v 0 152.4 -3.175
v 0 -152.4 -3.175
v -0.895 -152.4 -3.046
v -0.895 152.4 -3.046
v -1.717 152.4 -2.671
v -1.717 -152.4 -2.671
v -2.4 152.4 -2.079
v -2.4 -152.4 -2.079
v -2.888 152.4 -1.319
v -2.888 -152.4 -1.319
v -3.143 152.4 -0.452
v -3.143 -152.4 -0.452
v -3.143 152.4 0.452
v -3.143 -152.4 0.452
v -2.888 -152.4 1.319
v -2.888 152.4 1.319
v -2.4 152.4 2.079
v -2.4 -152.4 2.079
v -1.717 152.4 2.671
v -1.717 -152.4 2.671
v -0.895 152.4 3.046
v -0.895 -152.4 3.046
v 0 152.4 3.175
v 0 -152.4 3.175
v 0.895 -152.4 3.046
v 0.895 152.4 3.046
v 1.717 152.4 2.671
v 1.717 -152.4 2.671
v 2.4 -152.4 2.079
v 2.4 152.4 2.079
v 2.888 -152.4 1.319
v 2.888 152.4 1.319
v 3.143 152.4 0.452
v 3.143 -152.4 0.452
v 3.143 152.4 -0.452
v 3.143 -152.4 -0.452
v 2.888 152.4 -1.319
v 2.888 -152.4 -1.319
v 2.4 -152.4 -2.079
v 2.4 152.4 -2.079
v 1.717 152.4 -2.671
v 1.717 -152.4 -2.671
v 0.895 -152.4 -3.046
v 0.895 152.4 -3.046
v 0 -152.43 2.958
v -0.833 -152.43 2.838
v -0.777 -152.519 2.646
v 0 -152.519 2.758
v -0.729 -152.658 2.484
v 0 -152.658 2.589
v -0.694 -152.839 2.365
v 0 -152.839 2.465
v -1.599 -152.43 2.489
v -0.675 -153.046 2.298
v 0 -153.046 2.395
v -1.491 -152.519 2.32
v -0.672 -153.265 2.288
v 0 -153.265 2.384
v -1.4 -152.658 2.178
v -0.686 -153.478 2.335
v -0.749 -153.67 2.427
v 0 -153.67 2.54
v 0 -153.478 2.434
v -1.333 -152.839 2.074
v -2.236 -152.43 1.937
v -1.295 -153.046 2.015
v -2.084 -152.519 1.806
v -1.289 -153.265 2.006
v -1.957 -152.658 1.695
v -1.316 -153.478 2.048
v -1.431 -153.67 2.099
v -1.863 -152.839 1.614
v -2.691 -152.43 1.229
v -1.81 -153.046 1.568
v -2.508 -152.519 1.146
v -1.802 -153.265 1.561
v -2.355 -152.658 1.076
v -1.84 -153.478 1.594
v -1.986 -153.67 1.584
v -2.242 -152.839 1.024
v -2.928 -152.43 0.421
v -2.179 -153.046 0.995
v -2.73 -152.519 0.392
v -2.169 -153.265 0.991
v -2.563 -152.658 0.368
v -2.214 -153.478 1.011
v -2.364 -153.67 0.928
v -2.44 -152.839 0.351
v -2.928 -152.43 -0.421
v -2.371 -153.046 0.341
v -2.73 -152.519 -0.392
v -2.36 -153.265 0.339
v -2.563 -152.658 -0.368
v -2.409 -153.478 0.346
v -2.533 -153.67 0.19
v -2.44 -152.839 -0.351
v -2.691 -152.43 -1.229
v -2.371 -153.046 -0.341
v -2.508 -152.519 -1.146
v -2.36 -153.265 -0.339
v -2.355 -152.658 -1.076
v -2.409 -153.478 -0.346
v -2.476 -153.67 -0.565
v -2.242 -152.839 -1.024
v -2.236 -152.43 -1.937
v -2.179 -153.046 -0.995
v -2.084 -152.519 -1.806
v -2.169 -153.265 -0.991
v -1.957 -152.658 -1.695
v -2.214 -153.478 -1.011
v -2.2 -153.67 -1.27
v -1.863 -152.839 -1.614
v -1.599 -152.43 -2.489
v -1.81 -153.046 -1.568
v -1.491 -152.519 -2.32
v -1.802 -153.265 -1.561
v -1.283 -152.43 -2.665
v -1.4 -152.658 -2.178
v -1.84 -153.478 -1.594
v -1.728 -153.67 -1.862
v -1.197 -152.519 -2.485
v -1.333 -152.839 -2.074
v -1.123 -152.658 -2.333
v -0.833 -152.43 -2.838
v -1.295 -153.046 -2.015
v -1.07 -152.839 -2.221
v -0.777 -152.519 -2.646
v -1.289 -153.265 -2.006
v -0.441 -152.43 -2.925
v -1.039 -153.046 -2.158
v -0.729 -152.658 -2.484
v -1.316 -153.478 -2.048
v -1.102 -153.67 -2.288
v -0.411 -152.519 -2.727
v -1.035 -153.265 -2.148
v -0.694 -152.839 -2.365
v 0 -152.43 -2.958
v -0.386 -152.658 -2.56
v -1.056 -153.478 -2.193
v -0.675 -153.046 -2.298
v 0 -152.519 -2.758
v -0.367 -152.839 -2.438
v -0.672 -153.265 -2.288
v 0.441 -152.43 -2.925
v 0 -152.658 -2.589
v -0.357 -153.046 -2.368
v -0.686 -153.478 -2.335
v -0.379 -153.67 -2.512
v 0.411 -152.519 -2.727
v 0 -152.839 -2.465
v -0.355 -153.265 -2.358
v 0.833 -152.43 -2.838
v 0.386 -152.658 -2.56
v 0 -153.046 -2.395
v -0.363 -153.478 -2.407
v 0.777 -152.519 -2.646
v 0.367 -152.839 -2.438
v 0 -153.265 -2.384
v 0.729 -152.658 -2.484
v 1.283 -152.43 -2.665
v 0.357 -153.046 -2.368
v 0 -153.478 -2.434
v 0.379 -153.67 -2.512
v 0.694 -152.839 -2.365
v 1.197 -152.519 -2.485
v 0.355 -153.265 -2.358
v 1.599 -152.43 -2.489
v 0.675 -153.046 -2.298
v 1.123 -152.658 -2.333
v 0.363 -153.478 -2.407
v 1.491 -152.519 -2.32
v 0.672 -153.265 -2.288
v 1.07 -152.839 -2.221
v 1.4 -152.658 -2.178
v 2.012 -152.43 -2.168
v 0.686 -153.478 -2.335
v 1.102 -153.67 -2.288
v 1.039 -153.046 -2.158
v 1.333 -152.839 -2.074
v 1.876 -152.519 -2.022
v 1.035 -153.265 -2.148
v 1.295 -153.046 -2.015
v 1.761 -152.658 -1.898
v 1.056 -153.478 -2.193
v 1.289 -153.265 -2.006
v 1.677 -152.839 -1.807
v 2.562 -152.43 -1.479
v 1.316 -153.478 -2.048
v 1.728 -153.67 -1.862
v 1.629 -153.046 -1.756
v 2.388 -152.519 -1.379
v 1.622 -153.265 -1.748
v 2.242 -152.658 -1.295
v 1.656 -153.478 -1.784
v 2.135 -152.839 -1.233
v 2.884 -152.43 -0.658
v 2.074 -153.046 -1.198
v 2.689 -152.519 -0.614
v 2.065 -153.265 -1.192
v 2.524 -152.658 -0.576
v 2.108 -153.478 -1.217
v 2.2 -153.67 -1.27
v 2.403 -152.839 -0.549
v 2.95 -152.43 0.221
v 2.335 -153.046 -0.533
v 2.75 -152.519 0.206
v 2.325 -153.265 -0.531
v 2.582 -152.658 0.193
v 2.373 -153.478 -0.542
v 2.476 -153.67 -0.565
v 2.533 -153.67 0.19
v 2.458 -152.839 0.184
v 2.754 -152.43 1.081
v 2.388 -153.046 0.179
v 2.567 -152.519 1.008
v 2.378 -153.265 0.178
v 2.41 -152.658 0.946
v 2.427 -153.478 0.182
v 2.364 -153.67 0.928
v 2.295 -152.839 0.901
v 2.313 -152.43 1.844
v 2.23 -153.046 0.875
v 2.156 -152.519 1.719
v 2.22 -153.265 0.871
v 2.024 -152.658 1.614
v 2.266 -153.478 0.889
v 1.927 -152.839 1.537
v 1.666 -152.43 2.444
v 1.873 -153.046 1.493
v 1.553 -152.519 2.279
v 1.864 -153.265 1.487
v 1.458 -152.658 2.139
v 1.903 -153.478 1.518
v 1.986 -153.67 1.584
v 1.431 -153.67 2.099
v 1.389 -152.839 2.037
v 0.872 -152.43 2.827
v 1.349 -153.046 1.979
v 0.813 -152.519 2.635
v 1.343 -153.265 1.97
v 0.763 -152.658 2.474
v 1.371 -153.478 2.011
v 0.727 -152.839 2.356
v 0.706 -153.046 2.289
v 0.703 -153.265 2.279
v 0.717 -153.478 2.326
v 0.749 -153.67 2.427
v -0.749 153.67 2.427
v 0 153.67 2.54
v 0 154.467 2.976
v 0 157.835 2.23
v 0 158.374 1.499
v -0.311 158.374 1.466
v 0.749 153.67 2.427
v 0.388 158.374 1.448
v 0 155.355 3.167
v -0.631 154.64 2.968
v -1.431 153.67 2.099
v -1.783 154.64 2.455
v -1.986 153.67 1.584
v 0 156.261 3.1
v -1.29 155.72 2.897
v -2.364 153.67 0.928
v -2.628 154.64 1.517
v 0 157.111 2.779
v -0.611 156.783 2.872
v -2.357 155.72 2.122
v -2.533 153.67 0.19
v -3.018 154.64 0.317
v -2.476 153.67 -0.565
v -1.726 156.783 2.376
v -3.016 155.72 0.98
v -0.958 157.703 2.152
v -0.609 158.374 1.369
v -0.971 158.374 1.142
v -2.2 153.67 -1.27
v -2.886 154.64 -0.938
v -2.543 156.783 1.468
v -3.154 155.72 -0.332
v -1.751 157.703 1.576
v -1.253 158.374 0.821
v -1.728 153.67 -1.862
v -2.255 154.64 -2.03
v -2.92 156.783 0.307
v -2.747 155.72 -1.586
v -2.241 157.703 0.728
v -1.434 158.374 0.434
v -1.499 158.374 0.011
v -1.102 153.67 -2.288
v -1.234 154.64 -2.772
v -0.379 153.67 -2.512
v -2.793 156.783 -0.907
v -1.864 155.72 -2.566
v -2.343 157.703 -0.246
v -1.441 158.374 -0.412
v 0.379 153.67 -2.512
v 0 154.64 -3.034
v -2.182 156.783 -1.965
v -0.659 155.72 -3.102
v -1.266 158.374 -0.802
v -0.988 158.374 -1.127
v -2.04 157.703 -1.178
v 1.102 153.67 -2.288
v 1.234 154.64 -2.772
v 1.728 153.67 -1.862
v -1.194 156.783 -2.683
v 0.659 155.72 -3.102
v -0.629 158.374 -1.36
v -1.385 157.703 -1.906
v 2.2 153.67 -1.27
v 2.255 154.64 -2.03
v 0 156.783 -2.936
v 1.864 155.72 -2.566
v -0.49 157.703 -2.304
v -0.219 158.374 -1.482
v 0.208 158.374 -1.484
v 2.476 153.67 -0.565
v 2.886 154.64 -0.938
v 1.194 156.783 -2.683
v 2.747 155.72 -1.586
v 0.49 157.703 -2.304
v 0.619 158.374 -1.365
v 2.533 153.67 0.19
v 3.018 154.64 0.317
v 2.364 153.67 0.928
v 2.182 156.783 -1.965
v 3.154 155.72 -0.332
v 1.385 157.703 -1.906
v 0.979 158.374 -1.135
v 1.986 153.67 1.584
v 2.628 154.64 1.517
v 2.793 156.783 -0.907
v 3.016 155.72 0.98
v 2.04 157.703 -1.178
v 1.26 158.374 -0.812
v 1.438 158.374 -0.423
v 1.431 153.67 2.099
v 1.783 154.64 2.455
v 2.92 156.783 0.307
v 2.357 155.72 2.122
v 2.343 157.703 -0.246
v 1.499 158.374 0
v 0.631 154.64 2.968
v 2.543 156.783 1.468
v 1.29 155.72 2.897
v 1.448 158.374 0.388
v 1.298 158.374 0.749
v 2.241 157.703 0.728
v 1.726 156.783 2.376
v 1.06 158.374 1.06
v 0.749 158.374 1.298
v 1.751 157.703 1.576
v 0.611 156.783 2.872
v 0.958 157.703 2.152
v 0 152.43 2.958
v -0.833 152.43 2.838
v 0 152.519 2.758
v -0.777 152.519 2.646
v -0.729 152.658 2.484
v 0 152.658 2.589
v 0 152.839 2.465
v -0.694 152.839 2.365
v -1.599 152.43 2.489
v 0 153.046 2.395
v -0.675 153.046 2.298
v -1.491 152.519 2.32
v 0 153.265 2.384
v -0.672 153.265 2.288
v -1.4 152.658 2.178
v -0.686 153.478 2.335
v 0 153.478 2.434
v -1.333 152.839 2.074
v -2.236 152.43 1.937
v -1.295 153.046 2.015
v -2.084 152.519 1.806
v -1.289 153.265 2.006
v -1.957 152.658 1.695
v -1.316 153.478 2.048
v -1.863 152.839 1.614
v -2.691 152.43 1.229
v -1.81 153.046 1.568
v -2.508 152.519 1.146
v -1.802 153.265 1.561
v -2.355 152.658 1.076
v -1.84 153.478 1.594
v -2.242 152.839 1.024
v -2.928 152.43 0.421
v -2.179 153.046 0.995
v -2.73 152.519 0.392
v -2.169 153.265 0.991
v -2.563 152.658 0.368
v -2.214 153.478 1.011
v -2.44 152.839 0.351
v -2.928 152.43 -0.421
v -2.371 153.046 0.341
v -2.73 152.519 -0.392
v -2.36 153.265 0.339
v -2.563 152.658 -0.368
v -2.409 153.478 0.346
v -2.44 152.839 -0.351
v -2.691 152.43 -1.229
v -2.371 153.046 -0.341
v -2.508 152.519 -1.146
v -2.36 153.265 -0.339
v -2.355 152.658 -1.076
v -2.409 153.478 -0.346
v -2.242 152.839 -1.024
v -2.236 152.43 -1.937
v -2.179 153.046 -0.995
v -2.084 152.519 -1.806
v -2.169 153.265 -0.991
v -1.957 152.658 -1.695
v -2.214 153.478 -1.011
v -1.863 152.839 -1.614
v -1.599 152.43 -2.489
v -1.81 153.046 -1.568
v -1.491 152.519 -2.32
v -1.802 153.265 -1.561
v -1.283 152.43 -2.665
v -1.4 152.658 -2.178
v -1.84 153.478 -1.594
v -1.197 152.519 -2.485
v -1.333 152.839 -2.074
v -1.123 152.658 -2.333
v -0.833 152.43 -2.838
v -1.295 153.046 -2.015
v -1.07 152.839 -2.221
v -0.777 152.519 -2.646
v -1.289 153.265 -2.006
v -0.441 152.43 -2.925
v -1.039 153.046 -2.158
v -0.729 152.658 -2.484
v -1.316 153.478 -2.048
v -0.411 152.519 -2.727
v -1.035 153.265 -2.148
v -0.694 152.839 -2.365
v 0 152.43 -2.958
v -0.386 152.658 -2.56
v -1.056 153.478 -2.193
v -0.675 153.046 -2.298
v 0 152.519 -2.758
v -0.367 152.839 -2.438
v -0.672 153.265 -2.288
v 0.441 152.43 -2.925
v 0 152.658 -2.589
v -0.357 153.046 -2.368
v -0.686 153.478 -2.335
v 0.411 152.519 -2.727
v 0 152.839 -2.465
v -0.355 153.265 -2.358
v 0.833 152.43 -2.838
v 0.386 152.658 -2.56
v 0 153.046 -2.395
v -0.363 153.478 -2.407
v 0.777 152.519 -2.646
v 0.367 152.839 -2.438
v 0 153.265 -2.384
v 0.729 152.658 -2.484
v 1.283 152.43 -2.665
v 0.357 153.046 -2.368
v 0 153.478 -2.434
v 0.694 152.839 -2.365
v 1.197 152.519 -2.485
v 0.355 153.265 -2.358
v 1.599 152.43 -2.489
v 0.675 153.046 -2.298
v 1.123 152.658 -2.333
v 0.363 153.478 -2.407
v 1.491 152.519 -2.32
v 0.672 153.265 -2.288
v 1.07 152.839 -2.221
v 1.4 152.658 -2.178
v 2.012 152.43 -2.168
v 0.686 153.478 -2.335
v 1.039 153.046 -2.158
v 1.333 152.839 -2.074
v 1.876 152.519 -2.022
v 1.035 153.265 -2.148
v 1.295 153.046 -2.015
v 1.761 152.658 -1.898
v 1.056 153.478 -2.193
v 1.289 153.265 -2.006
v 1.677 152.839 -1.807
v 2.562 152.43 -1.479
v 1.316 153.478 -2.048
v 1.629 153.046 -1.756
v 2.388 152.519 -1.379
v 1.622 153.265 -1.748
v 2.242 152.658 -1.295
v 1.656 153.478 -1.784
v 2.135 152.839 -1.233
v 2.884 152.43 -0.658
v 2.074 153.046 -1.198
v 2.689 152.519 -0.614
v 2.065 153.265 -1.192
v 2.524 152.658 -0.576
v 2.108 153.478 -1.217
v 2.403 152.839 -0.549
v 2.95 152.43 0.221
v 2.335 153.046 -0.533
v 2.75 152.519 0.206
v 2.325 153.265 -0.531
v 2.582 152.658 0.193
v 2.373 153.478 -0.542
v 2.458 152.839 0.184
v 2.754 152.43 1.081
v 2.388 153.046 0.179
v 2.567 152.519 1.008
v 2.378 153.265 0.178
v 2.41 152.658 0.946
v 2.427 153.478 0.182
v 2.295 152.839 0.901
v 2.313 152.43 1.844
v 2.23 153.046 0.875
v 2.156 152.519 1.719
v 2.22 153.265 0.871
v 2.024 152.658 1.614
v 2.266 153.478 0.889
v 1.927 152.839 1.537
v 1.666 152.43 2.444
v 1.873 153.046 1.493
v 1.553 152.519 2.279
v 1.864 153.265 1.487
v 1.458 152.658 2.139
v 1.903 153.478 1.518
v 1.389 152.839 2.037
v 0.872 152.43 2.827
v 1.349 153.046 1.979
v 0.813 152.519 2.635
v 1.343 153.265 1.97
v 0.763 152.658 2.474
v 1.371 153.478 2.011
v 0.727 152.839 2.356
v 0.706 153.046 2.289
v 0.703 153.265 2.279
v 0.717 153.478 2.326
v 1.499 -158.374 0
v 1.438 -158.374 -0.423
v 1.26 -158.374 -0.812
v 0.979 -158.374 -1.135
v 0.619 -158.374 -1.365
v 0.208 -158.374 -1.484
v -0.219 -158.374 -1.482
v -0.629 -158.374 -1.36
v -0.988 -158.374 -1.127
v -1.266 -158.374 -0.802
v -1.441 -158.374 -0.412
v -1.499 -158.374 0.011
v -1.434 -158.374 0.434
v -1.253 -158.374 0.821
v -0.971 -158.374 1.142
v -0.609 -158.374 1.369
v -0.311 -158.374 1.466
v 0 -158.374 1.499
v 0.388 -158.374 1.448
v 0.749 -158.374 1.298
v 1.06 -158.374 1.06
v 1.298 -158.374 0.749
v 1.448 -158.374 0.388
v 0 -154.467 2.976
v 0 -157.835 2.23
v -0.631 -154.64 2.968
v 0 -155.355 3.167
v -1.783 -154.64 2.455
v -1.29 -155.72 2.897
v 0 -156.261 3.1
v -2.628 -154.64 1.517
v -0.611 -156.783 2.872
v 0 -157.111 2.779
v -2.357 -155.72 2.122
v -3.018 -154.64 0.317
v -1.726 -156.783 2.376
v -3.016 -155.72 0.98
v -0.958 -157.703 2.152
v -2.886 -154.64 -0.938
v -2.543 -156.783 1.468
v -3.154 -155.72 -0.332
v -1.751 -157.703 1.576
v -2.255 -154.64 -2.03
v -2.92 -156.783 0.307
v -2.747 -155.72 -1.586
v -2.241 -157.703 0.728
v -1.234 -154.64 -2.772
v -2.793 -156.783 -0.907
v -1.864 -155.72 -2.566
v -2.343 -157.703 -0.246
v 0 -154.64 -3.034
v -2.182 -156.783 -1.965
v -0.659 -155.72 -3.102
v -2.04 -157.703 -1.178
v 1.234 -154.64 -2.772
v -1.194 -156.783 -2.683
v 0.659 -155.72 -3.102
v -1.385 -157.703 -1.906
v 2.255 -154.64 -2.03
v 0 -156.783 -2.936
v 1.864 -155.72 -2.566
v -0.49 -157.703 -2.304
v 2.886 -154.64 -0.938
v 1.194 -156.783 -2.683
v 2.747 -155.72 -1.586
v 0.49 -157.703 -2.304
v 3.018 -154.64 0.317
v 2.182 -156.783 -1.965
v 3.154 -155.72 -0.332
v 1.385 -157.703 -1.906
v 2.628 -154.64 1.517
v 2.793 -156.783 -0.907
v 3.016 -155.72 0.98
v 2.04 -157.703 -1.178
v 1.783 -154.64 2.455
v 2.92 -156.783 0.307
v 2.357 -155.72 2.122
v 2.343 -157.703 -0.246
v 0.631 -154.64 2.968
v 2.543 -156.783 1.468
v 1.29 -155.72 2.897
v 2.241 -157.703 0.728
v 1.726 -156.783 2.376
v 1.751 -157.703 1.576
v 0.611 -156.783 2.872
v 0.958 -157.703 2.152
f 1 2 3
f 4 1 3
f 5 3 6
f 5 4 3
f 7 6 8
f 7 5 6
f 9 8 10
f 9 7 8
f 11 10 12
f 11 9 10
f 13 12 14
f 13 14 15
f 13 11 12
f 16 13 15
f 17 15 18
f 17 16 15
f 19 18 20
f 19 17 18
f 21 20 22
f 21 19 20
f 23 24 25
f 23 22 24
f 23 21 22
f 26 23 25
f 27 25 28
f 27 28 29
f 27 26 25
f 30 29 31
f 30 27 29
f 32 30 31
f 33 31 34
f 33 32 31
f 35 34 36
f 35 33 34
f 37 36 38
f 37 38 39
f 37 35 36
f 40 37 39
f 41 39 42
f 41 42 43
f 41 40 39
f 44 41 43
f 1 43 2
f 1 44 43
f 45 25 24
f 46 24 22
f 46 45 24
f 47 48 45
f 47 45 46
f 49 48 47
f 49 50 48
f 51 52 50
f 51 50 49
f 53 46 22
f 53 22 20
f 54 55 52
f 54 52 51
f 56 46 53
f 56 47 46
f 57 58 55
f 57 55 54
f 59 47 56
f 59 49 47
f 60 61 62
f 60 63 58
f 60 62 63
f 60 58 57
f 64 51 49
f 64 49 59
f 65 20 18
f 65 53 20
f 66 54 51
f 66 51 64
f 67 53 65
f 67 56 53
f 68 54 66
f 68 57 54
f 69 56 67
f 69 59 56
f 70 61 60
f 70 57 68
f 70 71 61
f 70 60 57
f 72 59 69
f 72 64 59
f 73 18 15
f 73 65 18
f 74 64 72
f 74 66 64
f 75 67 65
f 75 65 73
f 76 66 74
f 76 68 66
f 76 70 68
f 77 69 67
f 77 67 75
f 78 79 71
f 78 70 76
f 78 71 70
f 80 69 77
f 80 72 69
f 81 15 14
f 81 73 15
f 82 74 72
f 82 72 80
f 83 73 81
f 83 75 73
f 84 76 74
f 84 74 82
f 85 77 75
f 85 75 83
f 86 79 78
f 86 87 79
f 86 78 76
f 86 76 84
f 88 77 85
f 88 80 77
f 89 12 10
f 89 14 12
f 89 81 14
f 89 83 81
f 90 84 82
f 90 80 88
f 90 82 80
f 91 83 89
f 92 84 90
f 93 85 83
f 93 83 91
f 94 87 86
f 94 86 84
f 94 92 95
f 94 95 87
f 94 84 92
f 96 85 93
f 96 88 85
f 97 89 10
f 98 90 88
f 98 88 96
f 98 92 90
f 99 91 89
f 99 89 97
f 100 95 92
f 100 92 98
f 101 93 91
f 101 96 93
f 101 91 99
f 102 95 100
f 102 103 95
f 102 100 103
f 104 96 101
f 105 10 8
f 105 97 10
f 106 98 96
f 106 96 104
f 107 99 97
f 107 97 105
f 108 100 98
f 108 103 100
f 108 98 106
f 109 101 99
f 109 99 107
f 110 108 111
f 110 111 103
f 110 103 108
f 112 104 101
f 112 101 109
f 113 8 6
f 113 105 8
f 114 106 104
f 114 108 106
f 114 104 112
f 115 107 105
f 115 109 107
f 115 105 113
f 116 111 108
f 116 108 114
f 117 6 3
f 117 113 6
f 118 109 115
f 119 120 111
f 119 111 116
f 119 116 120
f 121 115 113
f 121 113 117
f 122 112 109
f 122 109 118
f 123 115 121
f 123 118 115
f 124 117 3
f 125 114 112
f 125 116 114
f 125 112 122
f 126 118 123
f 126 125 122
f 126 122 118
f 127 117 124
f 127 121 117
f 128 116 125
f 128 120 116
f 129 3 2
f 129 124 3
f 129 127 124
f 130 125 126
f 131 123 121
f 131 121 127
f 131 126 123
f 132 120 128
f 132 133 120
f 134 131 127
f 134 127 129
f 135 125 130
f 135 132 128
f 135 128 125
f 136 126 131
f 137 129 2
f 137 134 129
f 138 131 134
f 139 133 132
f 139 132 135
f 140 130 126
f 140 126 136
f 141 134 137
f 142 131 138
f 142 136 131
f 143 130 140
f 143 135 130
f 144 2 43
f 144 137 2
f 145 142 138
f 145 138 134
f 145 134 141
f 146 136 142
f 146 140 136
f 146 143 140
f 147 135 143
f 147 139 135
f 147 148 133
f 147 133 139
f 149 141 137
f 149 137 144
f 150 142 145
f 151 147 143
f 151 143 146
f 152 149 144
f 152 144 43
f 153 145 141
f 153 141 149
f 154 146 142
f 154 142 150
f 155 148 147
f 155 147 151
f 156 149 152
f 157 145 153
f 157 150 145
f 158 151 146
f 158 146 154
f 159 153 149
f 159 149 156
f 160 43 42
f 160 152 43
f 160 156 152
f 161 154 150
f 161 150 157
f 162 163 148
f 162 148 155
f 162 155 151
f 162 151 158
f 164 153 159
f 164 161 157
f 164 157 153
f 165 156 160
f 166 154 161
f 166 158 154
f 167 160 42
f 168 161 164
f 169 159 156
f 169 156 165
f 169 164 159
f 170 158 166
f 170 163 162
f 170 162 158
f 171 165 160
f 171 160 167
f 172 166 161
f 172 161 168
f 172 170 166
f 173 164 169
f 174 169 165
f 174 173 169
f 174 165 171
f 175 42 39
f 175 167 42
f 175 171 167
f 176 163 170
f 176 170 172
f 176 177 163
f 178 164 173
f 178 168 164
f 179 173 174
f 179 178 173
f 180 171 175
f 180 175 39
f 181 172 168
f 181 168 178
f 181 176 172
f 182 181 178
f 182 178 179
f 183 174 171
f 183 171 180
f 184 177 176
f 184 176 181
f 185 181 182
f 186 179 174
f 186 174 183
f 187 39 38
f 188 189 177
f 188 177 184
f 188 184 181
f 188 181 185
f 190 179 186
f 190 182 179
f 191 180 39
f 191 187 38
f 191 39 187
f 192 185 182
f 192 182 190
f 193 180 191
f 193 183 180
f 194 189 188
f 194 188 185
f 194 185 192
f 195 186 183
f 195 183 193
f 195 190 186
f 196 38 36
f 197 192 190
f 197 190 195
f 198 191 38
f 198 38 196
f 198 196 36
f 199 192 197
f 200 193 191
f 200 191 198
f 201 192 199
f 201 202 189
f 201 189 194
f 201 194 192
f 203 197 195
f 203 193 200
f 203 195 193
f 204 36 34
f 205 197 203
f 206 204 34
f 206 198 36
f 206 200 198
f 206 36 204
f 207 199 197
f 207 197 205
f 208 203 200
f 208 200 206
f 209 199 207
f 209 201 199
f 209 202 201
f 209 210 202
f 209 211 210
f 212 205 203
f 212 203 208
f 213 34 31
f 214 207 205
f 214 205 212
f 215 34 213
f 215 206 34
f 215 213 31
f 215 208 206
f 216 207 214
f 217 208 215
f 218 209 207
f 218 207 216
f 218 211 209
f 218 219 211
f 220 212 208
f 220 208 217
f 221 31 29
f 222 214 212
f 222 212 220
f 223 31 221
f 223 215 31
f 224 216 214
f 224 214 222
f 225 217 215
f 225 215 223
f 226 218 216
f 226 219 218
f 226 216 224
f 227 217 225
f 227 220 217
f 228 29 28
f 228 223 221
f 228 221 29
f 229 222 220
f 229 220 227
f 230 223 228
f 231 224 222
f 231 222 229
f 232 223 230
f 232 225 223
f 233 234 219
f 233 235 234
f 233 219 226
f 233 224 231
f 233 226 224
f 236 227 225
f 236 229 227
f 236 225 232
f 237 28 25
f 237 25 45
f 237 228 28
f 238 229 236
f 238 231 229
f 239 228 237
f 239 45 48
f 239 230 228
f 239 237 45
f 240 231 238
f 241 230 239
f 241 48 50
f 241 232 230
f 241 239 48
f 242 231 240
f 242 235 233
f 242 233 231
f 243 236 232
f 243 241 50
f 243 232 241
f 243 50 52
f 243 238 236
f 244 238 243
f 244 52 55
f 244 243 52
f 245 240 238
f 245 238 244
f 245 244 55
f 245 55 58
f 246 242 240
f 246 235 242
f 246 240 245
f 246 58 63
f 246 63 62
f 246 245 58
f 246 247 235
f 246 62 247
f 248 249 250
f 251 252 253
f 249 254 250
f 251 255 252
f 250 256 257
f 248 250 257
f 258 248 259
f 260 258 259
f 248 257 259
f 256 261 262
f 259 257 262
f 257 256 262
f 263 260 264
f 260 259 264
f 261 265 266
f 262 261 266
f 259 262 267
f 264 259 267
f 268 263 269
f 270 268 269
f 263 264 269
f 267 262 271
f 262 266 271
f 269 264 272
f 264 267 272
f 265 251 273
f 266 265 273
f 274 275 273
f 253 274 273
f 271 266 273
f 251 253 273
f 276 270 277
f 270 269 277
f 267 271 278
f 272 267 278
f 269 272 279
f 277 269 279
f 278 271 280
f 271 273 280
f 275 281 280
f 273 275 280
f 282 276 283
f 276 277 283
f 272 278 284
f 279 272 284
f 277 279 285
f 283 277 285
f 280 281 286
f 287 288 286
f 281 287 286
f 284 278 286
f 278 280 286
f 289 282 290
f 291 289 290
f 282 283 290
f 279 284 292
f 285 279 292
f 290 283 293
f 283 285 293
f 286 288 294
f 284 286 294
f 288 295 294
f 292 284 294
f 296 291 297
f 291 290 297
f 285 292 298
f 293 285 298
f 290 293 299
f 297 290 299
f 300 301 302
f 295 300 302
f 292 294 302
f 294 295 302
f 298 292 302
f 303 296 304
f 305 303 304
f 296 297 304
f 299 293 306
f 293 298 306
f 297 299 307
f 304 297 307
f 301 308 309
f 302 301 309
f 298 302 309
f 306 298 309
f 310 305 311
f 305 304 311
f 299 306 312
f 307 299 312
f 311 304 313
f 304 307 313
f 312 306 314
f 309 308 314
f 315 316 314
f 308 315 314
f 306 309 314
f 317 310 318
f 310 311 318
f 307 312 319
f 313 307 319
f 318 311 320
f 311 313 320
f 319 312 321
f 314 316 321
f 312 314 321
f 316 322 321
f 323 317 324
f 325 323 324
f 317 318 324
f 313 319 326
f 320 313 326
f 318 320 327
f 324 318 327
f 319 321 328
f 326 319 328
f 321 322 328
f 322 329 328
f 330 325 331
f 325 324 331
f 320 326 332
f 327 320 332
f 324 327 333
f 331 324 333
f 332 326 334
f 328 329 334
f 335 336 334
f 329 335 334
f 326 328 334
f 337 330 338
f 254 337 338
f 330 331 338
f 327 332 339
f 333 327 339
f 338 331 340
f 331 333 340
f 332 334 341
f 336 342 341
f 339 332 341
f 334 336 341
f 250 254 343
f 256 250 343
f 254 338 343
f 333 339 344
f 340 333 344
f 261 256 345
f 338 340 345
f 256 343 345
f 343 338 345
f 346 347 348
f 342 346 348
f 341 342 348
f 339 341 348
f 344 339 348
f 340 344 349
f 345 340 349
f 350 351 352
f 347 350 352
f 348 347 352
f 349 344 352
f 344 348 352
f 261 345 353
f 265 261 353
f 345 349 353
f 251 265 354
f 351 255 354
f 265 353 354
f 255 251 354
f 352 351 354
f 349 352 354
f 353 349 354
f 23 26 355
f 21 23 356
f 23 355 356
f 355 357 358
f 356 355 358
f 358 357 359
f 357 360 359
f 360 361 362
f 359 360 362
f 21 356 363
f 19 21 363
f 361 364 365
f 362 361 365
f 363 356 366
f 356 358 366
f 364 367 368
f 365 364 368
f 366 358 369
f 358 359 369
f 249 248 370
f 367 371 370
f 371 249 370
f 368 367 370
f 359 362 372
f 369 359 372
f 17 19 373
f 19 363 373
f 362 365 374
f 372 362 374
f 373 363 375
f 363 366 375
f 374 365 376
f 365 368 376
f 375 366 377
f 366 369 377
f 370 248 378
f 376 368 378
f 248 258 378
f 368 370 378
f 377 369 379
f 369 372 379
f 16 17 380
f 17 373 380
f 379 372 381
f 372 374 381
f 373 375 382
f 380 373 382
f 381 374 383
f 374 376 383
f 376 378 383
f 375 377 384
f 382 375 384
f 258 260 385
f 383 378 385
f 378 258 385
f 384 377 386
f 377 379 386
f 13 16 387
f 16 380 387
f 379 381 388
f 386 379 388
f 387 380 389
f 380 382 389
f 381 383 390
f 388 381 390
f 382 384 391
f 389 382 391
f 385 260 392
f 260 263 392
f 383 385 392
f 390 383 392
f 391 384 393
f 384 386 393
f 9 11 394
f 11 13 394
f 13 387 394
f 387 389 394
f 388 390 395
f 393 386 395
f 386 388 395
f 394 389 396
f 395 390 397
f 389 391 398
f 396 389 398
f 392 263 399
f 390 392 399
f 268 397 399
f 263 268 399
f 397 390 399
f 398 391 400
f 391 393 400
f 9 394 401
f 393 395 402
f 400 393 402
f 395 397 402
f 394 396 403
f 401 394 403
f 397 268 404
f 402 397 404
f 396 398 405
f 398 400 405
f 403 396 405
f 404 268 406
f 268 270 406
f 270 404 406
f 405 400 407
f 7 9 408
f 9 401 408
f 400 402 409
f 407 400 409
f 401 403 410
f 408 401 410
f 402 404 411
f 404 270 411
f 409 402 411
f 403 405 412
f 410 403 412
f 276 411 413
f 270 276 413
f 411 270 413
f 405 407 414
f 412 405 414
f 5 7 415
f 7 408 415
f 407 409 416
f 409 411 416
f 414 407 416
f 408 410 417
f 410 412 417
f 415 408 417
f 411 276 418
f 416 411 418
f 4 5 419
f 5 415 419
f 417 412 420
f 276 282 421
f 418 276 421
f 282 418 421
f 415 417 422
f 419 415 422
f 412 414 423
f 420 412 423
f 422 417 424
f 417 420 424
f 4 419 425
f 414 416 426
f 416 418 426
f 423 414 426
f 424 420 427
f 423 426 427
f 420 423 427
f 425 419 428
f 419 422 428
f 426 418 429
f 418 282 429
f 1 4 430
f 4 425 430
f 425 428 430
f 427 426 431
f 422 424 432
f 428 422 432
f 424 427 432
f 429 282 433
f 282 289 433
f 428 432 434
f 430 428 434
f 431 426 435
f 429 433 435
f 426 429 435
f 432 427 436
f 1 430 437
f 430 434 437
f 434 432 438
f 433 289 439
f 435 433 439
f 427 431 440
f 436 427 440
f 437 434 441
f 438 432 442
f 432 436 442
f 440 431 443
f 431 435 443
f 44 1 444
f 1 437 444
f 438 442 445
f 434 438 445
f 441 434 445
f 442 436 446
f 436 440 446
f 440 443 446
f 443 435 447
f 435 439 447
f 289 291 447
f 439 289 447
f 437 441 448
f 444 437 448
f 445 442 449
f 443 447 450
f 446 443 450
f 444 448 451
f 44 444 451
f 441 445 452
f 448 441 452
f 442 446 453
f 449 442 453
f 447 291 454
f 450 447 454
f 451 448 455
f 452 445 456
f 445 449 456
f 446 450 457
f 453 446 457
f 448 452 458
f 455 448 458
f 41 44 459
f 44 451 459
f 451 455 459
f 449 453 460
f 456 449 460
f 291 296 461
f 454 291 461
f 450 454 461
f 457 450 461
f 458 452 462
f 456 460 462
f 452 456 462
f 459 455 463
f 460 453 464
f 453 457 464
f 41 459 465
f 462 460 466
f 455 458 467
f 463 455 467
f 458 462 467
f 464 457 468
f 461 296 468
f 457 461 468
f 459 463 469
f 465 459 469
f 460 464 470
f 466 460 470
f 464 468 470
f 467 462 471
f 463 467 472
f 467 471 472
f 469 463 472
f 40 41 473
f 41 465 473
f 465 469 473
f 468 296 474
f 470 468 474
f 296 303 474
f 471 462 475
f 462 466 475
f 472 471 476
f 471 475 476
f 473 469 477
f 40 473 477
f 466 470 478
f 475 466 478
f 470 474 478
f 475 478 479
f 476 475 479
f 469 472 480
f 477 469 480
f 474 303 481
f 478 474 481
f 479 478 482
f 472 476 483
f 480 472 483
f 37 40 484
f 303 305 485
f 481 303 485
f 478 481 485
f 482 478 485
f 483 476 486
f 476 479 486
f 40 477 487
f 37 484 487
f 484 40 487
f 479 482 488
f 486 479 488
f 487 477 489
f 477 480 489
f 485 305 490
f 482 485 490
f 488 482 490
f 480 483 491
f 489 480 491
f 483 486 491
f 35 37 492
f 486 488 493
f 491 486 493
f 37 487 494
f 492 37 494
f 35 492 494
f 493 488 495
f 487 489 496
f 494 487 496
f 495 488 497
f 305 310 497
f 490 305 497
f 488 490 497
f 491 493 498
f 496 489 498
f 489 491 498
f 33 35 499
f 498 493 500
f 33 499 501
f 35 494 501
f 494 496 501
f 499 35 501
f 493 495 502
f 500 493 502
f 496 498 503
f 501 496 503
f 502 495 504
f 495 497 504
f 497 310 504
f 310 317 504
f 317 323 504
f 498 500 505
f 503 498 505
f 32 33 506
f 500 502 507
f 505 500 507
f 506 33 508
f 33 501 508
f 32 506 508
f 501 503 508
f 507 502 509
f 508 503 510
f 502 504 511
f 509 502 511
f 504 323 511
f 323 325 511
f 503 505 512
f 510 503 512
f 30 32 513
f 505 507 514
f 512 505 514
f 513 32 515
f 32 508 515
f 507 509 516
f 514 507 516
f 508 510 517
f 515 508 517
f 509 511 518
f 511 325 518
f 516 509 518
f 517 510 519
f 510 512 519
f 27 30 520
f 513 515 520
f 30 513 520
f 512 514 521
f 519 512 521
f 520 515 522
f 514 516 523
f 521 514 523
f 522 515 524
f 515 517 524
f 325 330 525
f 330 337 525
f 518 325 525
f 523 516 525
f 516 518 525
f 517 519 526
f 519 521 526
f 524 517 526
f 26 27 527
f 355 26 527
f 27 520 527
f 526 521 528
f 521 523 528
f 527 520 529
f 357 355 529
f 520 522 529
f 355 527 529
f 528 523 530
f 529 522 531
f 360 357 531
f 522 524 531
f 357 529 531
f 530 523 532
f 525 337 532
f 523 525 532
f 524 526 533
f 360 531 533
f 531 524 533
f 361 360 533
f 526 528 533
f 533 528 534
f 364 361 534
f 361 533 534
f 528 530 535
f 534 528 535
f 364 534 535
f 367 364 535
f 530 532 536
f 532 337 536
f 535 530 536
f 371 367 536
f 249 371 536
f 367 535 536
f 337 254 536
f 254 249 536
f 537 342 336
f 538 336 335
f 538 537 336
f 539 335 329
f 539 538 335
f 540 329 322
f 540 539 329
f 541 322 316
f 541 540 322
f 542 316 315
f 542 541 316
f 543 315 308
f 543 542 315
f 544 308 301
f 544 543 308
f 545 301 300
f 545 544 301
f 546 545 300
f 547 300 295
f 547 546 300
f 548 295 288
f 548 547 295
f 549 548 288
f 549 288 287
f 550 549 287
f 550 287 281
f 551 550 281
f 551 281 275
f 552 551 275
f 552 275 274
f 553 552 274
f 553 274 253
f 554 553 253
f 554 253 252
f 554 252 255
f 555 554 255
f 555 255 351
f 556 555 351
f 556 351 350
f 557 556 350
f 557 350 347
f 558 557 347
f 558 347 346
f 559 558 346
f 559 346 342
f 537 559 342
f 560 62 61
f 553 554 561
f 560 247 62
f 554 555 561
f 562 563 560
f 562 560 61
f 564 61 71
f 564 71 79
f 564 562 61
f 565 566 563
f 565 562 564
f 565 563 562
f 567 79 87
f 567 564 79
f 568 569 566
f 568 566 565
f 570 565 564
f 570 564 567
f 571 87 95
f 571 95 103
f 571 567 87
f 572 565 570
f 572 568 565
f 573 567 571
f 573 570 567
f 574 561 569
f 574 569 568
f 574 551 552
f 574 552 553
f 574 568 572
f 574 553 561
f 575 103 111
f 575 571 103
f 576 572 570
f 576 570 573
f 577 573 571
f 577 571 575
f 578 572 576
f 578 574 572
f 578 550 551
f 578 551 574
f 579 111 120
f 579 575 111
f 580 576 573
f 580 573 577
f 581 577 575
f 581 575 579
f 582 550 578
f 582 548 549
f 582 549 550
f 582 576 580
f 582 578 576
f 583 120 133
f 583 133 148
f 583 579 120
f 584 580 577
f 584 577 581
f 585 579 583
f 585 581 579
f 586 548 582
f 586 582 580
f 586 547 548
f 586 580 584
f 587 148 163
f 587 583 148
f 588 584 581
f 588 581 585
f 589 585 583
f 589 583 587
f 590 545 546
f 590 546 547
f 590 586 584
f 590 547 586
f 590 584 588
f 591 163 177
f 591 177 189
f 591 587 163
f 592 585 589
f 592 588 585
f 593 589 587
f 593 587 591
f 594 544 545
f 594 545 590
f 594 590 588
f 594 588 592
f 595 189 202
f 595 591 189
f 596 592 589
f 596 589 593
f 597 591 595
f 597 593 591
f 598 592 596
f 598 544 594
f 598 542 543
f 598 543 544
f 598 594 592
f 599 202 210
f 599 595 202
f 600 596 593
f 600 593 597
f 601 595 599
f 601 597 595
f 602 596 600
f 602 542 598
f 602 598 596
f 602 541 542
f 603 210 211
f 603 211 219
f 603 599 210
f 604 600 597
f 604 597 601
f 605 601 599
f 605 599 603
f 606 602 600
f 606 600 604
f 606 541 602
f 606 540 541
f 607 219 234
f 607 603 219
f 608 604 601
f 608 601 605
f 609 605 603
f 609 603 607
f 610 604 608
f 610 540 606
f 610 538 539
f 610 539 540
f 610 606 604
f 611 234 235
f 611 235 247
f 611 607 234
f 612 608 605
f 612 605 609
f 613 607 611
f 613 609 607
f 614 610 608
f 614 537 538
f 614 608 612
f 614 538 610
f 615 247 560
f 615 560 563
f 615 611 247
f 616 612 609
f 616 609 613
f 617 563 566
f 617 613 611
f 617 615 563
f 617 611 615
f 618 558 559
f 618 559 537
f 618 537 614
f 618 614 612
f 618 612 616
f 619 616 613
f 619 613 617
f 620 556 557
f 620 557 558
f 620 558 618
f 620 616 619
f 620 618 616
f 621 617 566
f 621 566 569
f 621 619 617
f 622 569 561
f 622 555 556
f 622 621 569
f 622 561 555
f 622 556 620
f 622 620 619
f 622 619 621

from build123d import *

# Parameters (mm, degrees)
SKETCH1_R               = 3.175
BOSS_EXTRUDE1_DEPTH     = 152.4
CUT_EXTRUDE1_DEPTH      = 159.813487305
CUT_EXTRUDE1_DEPTH_BACK = 159.813487305
SKETCH3_R               = 1.4986


with BuildPart() as part:
    # Sketch1 → Boss-Extrude1 (new, symmetric)
    with BuildSketch(Plane(origin=(0, 0, 0), x_dir=(1, 0, 0), z_dir=(0, 1, 0))):
        with Locations(Location((0, 0, 0), (0, 0, 90))):
            Circle(SKETCH1_R)
    extrude(amount=BOSS_EXTRUDE1_DEPTH, both=True)

    # Sketch2 → Revolve1 (revolve)
    with BuildSketch(Plane.XY, mode=Mode.PRIVATE) as revolve1_sk:
        with BuildLine():
            Line((0, 158.75), (0, 152.4))
            Line((0, 152.4), (-3.175, 152.4))
            ThreePointArc((-3.175, 152.4), (-2.465048417, 152.838774209), (-2.54, 153.67))
            ThreePointArc((-2.54, 153.67), (-2.839806331, 156.994903166), (0, 158.75))
        make_face()
    revolve1 = revolve(revolve1_sk.sketch.rotate(Axis((0, 158.75, 0), (0, -1, 0)), 270), axis=Axis((0, 158.75, 0), (0, -1, 0)))

    # Mirror1: Revolve1 across plane
    add(revolve1.mirror(Plane.ZX))

    # Sketch3 → Cut-Extrude1 (cut, two sides: drawn at the far end of the back side and taken through both)
    with BuildSketch(Plane(origin=(0, 0, 0), x_dir=(1, 0, 0), z_dir=(0, 1, 0)).offset(-CUT_EXTRUDE1_DEPTH_BACK)):
        Circle(SKETCH3_R)
    extrude(amount=CUT_EXTRUDE1_DEPTH + CUT_EXTRUDE1_DEPTH_BACK, mode=Mode.SUBTRACT)


solid = part.part
